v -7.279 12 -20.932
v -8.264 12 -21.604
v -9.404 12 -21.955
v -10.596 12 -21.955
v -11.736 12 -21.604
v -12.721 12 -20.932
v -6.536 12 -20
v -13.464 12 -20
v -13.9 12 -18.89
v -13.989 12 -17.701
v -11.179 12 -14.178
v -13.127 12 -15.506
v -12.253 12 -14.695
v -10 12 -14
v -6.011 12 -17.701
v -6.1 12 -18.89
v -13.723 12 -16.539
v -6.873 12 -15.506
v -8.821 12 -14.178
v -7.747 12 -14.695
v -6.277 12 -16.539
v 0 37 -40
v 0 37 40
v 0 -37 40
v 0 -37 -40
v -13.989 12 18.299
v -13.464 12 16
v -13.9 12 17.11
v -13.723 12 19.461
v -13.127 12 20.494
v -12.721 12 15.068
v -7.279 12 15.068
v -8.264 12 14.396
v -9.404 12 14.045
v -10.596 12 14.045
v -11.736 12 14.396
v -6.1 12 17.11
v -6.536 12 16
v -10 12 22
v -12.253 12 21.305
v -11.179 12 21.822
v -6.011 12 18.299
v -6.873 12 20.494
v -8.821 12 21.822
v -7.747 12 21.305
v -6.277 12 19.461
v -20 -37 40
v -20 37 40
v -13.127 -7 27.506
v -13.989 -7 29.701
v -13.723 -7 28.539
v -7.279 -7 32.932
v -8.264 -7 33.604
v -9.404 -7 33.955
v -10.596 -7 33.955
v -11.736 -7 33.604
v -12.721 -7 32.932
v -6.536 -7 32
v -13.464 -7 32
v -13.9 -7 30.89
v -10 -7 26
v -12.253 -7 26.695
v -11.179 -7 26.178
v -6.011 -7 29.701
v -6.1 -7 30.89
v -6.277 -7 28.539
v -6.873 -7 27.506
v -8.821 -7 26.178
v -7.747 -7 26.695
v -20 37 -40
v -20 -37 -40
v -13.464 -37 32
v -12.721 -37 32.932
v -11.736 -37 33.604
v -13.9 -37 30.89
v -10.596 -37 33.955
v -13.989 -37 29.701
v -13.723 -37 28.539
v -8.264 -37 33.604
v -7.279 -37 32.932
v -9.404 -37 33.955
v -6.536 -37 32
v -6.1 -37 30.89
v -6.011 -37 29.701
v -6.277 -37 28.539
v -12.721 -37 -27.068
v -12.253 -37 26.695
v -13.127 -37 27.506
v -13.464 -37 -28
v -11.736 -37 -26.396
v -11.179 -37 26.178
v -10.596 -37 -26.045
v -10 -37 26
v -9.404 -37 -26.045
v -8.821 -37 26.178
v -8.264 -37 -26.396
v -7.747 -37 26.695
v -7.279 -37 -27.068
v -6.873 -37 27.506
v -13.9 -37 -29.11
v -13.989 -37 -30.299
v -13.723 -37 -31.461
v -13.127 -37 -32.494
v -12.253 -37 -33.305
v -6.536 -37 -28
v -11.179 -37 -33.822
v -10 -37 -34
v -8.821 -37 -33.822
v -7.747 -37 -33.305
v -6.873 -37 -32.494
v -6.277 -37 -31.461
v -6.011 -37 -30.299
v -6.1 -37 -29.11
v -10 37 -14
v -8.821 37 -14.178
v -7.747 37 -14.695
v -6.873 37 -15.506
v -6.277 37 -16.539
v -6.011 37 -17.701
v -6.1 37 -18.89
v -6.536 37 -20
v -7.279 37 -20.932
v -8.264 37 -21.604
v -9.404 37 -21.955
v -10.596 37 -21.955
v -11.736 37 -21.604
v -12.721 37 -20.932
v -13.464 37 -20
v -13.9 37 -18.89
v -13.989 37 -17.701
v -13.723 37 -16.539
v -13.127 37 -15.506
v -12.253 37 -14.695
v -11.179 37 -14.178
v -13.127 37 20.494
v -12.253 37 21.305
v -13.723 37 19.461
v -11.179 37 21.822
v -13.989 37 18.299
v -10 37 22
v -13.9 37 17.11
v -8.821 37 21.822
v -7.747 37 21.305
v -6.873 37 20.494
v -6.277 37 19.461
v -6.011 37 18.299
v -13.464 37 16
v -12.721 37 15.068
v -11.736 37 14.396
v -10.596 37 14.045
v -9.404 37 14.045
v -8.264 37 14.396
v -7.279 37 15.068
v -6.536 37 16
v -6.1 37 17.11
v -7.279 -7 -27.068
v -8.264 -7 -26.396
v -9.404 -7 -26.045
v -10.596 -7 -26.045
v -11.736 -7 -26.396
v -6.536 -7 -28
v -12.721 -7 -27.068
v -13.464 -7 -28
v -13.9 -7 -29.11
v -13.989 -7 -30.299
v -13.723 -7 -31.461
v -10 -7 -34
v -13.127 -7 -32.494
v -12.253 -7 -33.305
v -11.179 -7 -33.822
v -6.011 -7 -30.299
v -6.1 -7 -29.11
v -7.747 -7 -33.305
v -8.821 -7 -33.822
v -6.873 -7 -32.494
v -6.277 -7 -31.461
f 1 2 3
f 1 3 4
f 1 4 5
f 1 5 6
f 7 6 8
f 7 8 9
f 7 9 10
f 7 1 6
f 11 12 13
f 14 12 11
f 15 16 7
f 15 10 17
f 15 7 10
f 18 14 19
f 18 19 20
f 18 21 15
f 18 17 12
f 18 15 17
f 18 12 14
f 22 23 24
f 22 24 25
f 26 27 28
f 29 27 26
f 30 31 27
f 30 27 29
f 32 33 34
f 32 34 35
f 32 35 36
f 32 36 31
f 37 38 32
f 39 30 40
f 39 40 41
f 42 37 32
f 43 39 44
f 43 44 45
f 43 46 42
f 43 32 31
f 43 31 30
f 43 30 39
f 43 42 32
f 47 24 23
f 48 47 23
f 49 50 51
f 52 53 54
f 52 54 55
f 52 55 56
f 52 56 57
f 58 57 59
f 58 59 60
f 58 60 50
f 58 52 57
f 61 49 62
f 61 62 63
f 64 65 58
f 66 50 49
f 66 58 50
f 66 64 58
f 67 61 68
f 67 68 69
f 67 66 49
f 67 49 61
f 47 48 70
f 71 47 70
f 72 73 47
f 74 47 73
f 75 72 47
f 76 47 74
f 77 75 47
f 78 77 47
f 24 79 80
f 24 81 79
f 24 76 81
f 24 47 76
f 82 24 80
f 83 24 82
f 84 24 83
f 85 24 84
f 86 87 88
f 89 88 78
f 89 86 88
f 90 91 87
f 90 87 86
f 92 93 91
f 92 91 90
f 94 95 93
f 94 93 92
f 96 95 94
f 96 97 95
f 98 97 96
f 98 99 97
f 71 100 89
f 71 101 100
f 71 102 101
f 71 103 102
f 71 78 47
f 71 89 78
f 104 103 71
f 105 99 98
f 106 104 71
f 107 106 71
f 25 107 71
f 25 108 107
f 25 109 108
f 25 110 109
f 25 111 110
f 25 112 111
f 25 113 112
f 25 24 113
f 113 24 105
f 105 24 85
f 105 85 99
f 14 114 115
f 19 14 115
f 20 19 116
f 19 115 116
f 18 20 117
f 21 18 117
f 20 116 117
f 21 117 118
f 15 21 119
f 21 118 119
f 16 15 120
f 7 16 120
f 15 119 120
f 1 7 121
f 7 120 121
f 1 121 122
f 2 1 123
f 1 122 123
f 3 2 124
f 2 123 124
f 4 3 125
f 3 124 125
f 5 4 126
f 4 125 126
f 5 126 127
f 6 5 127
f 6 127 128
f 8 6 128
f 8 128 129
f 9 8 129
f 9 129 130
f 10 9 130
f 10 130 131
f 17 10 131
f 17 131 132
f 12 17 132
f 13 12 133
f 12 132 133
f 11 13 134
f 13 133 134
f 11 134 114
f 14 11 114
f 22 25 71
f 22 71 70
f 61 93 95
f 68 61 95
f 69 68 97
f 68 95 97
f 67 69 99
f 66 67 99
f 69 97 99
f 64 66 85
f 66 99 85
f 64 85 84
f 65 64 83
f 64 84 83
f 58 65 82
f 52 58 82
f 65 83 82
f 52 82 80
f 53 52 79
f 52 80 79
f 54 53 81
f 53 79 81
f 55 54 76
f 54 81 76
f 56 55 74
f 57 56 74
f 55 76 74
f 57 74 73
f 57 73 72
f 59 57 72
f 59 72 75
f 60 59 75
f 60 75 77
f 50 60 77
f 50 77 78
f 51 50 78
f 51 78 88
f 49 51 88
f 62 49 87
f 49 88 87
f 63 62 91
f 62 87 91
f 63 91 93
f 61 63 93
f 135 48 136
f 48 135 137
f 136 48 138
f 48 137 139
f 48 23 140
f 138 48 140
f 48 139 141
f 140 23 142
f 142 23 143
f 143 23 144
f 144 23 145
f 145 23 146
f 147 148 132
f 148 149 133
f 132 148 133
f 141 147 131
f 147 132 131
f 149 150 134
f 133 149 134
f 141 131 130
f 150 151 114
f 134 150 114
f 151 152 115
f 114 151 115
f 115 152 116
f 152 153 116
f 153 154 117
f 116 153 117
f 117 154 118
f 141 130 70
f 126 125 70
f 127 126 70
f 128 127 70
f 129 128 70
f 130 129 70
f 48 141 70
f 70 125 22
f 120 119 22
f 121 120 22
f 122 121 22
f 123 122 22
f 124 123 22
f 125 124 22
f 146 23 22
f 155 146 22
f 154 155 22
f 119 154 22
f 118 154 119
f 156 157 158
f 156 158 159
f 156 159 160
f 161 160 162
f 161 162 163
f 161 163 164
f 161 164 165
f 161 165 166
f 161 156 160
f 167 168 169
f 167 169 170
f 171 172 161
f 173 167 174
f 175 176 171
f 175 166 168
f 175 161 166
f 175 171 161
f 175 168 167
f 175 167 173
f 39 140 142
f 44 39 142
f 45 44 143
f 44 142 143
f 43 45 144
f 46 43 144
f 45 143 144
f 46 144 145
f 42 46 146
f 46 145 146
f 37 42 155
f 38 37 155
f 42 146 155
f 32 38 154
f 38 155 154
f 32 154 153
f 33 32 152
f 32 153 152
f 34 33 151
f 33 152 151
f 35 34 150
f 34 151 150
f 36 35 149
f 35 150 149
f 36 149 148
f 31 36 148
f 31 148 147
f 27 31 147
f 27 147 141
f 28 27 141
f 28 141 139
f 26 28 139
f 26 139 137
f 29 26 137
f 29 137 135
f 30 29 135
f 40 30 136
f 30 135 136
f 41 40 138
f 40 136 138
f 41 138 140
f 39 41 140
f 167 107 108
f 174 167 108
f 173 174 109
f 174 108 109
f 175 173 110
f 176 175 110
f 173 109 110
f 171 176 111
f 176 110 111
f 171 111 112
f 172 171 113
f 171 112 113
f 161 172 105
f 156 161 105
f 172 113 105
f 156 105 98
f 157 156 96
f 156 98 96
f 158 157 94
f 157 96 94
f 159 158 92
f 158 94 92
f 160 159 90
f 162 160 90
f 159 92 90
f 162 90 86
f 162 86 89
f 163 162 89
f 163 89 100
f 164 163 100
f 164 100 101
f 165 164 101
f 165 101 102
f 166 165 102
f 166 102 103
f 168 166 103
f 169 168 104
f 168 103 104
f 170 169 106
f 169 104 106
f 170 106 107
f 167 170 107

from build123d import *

# Parameters (mm, degrees)
CROQUIS1_W              = 80
CROQUIS1_H              = 74
SALIENTE_EXTRUIR1_DEPTH = 20
CROQUIS3_R              = 4
CORTAR_EXTRUIR2_DEPTH   = 25
CROQUIS4_R              = 4
CORTAR_EXTRUIR3_DEPTH   = 30


with BuildPart() as part:
    # Croquis1 → Saliente-Extruir1 (new body)
    with BuildSketch(Plane(origin=(0, 0, 0), x_dir=(0, 0, -1), z_dir=(1, 0, 0))):
        Rectangle(CROQUIS1_W, CROQUIS1_H)
    extrude(amount=-SALIENTE_EXTRUIR1_DEPTH)

    # Croquis3 → Cortar-Extruir2 (cut)
    with BuildSketch(Plane(origin=(0, 37, 0), x_dir=(1, 0, 0), z_dir=(0, 1, 0))):
        with Locations(Location((-10, -18, 0), (0, 0, 270))):
            Circle(CROQUIS3_R)
        with Locations(Location((-10, 18, 0), (0, 0, 270))):
            Circle(CROQUIS3_R)
    extrude(amount=-CORTAR_EXTRUIR2_DEPTH, mode=Mode.SUBTRACT)

    # Croquis4 → Cortar-Extruir3 (cut)
    with BuildSketch(Plane.XZ.offset(37)):
        with Locations(Location((-10, 30, 0), (0, 0, 270))):
            Circle(CROQUIS4_R)
        with Locations(Location((-10, -30, 0), (0, 0, 270))):
            Circle(CROQUIS4_R)
    extrude(amount=-CORTAR_EXTRUIR3_DEPTH, mode=Mode.SUBTRACT)


solid = part.part
